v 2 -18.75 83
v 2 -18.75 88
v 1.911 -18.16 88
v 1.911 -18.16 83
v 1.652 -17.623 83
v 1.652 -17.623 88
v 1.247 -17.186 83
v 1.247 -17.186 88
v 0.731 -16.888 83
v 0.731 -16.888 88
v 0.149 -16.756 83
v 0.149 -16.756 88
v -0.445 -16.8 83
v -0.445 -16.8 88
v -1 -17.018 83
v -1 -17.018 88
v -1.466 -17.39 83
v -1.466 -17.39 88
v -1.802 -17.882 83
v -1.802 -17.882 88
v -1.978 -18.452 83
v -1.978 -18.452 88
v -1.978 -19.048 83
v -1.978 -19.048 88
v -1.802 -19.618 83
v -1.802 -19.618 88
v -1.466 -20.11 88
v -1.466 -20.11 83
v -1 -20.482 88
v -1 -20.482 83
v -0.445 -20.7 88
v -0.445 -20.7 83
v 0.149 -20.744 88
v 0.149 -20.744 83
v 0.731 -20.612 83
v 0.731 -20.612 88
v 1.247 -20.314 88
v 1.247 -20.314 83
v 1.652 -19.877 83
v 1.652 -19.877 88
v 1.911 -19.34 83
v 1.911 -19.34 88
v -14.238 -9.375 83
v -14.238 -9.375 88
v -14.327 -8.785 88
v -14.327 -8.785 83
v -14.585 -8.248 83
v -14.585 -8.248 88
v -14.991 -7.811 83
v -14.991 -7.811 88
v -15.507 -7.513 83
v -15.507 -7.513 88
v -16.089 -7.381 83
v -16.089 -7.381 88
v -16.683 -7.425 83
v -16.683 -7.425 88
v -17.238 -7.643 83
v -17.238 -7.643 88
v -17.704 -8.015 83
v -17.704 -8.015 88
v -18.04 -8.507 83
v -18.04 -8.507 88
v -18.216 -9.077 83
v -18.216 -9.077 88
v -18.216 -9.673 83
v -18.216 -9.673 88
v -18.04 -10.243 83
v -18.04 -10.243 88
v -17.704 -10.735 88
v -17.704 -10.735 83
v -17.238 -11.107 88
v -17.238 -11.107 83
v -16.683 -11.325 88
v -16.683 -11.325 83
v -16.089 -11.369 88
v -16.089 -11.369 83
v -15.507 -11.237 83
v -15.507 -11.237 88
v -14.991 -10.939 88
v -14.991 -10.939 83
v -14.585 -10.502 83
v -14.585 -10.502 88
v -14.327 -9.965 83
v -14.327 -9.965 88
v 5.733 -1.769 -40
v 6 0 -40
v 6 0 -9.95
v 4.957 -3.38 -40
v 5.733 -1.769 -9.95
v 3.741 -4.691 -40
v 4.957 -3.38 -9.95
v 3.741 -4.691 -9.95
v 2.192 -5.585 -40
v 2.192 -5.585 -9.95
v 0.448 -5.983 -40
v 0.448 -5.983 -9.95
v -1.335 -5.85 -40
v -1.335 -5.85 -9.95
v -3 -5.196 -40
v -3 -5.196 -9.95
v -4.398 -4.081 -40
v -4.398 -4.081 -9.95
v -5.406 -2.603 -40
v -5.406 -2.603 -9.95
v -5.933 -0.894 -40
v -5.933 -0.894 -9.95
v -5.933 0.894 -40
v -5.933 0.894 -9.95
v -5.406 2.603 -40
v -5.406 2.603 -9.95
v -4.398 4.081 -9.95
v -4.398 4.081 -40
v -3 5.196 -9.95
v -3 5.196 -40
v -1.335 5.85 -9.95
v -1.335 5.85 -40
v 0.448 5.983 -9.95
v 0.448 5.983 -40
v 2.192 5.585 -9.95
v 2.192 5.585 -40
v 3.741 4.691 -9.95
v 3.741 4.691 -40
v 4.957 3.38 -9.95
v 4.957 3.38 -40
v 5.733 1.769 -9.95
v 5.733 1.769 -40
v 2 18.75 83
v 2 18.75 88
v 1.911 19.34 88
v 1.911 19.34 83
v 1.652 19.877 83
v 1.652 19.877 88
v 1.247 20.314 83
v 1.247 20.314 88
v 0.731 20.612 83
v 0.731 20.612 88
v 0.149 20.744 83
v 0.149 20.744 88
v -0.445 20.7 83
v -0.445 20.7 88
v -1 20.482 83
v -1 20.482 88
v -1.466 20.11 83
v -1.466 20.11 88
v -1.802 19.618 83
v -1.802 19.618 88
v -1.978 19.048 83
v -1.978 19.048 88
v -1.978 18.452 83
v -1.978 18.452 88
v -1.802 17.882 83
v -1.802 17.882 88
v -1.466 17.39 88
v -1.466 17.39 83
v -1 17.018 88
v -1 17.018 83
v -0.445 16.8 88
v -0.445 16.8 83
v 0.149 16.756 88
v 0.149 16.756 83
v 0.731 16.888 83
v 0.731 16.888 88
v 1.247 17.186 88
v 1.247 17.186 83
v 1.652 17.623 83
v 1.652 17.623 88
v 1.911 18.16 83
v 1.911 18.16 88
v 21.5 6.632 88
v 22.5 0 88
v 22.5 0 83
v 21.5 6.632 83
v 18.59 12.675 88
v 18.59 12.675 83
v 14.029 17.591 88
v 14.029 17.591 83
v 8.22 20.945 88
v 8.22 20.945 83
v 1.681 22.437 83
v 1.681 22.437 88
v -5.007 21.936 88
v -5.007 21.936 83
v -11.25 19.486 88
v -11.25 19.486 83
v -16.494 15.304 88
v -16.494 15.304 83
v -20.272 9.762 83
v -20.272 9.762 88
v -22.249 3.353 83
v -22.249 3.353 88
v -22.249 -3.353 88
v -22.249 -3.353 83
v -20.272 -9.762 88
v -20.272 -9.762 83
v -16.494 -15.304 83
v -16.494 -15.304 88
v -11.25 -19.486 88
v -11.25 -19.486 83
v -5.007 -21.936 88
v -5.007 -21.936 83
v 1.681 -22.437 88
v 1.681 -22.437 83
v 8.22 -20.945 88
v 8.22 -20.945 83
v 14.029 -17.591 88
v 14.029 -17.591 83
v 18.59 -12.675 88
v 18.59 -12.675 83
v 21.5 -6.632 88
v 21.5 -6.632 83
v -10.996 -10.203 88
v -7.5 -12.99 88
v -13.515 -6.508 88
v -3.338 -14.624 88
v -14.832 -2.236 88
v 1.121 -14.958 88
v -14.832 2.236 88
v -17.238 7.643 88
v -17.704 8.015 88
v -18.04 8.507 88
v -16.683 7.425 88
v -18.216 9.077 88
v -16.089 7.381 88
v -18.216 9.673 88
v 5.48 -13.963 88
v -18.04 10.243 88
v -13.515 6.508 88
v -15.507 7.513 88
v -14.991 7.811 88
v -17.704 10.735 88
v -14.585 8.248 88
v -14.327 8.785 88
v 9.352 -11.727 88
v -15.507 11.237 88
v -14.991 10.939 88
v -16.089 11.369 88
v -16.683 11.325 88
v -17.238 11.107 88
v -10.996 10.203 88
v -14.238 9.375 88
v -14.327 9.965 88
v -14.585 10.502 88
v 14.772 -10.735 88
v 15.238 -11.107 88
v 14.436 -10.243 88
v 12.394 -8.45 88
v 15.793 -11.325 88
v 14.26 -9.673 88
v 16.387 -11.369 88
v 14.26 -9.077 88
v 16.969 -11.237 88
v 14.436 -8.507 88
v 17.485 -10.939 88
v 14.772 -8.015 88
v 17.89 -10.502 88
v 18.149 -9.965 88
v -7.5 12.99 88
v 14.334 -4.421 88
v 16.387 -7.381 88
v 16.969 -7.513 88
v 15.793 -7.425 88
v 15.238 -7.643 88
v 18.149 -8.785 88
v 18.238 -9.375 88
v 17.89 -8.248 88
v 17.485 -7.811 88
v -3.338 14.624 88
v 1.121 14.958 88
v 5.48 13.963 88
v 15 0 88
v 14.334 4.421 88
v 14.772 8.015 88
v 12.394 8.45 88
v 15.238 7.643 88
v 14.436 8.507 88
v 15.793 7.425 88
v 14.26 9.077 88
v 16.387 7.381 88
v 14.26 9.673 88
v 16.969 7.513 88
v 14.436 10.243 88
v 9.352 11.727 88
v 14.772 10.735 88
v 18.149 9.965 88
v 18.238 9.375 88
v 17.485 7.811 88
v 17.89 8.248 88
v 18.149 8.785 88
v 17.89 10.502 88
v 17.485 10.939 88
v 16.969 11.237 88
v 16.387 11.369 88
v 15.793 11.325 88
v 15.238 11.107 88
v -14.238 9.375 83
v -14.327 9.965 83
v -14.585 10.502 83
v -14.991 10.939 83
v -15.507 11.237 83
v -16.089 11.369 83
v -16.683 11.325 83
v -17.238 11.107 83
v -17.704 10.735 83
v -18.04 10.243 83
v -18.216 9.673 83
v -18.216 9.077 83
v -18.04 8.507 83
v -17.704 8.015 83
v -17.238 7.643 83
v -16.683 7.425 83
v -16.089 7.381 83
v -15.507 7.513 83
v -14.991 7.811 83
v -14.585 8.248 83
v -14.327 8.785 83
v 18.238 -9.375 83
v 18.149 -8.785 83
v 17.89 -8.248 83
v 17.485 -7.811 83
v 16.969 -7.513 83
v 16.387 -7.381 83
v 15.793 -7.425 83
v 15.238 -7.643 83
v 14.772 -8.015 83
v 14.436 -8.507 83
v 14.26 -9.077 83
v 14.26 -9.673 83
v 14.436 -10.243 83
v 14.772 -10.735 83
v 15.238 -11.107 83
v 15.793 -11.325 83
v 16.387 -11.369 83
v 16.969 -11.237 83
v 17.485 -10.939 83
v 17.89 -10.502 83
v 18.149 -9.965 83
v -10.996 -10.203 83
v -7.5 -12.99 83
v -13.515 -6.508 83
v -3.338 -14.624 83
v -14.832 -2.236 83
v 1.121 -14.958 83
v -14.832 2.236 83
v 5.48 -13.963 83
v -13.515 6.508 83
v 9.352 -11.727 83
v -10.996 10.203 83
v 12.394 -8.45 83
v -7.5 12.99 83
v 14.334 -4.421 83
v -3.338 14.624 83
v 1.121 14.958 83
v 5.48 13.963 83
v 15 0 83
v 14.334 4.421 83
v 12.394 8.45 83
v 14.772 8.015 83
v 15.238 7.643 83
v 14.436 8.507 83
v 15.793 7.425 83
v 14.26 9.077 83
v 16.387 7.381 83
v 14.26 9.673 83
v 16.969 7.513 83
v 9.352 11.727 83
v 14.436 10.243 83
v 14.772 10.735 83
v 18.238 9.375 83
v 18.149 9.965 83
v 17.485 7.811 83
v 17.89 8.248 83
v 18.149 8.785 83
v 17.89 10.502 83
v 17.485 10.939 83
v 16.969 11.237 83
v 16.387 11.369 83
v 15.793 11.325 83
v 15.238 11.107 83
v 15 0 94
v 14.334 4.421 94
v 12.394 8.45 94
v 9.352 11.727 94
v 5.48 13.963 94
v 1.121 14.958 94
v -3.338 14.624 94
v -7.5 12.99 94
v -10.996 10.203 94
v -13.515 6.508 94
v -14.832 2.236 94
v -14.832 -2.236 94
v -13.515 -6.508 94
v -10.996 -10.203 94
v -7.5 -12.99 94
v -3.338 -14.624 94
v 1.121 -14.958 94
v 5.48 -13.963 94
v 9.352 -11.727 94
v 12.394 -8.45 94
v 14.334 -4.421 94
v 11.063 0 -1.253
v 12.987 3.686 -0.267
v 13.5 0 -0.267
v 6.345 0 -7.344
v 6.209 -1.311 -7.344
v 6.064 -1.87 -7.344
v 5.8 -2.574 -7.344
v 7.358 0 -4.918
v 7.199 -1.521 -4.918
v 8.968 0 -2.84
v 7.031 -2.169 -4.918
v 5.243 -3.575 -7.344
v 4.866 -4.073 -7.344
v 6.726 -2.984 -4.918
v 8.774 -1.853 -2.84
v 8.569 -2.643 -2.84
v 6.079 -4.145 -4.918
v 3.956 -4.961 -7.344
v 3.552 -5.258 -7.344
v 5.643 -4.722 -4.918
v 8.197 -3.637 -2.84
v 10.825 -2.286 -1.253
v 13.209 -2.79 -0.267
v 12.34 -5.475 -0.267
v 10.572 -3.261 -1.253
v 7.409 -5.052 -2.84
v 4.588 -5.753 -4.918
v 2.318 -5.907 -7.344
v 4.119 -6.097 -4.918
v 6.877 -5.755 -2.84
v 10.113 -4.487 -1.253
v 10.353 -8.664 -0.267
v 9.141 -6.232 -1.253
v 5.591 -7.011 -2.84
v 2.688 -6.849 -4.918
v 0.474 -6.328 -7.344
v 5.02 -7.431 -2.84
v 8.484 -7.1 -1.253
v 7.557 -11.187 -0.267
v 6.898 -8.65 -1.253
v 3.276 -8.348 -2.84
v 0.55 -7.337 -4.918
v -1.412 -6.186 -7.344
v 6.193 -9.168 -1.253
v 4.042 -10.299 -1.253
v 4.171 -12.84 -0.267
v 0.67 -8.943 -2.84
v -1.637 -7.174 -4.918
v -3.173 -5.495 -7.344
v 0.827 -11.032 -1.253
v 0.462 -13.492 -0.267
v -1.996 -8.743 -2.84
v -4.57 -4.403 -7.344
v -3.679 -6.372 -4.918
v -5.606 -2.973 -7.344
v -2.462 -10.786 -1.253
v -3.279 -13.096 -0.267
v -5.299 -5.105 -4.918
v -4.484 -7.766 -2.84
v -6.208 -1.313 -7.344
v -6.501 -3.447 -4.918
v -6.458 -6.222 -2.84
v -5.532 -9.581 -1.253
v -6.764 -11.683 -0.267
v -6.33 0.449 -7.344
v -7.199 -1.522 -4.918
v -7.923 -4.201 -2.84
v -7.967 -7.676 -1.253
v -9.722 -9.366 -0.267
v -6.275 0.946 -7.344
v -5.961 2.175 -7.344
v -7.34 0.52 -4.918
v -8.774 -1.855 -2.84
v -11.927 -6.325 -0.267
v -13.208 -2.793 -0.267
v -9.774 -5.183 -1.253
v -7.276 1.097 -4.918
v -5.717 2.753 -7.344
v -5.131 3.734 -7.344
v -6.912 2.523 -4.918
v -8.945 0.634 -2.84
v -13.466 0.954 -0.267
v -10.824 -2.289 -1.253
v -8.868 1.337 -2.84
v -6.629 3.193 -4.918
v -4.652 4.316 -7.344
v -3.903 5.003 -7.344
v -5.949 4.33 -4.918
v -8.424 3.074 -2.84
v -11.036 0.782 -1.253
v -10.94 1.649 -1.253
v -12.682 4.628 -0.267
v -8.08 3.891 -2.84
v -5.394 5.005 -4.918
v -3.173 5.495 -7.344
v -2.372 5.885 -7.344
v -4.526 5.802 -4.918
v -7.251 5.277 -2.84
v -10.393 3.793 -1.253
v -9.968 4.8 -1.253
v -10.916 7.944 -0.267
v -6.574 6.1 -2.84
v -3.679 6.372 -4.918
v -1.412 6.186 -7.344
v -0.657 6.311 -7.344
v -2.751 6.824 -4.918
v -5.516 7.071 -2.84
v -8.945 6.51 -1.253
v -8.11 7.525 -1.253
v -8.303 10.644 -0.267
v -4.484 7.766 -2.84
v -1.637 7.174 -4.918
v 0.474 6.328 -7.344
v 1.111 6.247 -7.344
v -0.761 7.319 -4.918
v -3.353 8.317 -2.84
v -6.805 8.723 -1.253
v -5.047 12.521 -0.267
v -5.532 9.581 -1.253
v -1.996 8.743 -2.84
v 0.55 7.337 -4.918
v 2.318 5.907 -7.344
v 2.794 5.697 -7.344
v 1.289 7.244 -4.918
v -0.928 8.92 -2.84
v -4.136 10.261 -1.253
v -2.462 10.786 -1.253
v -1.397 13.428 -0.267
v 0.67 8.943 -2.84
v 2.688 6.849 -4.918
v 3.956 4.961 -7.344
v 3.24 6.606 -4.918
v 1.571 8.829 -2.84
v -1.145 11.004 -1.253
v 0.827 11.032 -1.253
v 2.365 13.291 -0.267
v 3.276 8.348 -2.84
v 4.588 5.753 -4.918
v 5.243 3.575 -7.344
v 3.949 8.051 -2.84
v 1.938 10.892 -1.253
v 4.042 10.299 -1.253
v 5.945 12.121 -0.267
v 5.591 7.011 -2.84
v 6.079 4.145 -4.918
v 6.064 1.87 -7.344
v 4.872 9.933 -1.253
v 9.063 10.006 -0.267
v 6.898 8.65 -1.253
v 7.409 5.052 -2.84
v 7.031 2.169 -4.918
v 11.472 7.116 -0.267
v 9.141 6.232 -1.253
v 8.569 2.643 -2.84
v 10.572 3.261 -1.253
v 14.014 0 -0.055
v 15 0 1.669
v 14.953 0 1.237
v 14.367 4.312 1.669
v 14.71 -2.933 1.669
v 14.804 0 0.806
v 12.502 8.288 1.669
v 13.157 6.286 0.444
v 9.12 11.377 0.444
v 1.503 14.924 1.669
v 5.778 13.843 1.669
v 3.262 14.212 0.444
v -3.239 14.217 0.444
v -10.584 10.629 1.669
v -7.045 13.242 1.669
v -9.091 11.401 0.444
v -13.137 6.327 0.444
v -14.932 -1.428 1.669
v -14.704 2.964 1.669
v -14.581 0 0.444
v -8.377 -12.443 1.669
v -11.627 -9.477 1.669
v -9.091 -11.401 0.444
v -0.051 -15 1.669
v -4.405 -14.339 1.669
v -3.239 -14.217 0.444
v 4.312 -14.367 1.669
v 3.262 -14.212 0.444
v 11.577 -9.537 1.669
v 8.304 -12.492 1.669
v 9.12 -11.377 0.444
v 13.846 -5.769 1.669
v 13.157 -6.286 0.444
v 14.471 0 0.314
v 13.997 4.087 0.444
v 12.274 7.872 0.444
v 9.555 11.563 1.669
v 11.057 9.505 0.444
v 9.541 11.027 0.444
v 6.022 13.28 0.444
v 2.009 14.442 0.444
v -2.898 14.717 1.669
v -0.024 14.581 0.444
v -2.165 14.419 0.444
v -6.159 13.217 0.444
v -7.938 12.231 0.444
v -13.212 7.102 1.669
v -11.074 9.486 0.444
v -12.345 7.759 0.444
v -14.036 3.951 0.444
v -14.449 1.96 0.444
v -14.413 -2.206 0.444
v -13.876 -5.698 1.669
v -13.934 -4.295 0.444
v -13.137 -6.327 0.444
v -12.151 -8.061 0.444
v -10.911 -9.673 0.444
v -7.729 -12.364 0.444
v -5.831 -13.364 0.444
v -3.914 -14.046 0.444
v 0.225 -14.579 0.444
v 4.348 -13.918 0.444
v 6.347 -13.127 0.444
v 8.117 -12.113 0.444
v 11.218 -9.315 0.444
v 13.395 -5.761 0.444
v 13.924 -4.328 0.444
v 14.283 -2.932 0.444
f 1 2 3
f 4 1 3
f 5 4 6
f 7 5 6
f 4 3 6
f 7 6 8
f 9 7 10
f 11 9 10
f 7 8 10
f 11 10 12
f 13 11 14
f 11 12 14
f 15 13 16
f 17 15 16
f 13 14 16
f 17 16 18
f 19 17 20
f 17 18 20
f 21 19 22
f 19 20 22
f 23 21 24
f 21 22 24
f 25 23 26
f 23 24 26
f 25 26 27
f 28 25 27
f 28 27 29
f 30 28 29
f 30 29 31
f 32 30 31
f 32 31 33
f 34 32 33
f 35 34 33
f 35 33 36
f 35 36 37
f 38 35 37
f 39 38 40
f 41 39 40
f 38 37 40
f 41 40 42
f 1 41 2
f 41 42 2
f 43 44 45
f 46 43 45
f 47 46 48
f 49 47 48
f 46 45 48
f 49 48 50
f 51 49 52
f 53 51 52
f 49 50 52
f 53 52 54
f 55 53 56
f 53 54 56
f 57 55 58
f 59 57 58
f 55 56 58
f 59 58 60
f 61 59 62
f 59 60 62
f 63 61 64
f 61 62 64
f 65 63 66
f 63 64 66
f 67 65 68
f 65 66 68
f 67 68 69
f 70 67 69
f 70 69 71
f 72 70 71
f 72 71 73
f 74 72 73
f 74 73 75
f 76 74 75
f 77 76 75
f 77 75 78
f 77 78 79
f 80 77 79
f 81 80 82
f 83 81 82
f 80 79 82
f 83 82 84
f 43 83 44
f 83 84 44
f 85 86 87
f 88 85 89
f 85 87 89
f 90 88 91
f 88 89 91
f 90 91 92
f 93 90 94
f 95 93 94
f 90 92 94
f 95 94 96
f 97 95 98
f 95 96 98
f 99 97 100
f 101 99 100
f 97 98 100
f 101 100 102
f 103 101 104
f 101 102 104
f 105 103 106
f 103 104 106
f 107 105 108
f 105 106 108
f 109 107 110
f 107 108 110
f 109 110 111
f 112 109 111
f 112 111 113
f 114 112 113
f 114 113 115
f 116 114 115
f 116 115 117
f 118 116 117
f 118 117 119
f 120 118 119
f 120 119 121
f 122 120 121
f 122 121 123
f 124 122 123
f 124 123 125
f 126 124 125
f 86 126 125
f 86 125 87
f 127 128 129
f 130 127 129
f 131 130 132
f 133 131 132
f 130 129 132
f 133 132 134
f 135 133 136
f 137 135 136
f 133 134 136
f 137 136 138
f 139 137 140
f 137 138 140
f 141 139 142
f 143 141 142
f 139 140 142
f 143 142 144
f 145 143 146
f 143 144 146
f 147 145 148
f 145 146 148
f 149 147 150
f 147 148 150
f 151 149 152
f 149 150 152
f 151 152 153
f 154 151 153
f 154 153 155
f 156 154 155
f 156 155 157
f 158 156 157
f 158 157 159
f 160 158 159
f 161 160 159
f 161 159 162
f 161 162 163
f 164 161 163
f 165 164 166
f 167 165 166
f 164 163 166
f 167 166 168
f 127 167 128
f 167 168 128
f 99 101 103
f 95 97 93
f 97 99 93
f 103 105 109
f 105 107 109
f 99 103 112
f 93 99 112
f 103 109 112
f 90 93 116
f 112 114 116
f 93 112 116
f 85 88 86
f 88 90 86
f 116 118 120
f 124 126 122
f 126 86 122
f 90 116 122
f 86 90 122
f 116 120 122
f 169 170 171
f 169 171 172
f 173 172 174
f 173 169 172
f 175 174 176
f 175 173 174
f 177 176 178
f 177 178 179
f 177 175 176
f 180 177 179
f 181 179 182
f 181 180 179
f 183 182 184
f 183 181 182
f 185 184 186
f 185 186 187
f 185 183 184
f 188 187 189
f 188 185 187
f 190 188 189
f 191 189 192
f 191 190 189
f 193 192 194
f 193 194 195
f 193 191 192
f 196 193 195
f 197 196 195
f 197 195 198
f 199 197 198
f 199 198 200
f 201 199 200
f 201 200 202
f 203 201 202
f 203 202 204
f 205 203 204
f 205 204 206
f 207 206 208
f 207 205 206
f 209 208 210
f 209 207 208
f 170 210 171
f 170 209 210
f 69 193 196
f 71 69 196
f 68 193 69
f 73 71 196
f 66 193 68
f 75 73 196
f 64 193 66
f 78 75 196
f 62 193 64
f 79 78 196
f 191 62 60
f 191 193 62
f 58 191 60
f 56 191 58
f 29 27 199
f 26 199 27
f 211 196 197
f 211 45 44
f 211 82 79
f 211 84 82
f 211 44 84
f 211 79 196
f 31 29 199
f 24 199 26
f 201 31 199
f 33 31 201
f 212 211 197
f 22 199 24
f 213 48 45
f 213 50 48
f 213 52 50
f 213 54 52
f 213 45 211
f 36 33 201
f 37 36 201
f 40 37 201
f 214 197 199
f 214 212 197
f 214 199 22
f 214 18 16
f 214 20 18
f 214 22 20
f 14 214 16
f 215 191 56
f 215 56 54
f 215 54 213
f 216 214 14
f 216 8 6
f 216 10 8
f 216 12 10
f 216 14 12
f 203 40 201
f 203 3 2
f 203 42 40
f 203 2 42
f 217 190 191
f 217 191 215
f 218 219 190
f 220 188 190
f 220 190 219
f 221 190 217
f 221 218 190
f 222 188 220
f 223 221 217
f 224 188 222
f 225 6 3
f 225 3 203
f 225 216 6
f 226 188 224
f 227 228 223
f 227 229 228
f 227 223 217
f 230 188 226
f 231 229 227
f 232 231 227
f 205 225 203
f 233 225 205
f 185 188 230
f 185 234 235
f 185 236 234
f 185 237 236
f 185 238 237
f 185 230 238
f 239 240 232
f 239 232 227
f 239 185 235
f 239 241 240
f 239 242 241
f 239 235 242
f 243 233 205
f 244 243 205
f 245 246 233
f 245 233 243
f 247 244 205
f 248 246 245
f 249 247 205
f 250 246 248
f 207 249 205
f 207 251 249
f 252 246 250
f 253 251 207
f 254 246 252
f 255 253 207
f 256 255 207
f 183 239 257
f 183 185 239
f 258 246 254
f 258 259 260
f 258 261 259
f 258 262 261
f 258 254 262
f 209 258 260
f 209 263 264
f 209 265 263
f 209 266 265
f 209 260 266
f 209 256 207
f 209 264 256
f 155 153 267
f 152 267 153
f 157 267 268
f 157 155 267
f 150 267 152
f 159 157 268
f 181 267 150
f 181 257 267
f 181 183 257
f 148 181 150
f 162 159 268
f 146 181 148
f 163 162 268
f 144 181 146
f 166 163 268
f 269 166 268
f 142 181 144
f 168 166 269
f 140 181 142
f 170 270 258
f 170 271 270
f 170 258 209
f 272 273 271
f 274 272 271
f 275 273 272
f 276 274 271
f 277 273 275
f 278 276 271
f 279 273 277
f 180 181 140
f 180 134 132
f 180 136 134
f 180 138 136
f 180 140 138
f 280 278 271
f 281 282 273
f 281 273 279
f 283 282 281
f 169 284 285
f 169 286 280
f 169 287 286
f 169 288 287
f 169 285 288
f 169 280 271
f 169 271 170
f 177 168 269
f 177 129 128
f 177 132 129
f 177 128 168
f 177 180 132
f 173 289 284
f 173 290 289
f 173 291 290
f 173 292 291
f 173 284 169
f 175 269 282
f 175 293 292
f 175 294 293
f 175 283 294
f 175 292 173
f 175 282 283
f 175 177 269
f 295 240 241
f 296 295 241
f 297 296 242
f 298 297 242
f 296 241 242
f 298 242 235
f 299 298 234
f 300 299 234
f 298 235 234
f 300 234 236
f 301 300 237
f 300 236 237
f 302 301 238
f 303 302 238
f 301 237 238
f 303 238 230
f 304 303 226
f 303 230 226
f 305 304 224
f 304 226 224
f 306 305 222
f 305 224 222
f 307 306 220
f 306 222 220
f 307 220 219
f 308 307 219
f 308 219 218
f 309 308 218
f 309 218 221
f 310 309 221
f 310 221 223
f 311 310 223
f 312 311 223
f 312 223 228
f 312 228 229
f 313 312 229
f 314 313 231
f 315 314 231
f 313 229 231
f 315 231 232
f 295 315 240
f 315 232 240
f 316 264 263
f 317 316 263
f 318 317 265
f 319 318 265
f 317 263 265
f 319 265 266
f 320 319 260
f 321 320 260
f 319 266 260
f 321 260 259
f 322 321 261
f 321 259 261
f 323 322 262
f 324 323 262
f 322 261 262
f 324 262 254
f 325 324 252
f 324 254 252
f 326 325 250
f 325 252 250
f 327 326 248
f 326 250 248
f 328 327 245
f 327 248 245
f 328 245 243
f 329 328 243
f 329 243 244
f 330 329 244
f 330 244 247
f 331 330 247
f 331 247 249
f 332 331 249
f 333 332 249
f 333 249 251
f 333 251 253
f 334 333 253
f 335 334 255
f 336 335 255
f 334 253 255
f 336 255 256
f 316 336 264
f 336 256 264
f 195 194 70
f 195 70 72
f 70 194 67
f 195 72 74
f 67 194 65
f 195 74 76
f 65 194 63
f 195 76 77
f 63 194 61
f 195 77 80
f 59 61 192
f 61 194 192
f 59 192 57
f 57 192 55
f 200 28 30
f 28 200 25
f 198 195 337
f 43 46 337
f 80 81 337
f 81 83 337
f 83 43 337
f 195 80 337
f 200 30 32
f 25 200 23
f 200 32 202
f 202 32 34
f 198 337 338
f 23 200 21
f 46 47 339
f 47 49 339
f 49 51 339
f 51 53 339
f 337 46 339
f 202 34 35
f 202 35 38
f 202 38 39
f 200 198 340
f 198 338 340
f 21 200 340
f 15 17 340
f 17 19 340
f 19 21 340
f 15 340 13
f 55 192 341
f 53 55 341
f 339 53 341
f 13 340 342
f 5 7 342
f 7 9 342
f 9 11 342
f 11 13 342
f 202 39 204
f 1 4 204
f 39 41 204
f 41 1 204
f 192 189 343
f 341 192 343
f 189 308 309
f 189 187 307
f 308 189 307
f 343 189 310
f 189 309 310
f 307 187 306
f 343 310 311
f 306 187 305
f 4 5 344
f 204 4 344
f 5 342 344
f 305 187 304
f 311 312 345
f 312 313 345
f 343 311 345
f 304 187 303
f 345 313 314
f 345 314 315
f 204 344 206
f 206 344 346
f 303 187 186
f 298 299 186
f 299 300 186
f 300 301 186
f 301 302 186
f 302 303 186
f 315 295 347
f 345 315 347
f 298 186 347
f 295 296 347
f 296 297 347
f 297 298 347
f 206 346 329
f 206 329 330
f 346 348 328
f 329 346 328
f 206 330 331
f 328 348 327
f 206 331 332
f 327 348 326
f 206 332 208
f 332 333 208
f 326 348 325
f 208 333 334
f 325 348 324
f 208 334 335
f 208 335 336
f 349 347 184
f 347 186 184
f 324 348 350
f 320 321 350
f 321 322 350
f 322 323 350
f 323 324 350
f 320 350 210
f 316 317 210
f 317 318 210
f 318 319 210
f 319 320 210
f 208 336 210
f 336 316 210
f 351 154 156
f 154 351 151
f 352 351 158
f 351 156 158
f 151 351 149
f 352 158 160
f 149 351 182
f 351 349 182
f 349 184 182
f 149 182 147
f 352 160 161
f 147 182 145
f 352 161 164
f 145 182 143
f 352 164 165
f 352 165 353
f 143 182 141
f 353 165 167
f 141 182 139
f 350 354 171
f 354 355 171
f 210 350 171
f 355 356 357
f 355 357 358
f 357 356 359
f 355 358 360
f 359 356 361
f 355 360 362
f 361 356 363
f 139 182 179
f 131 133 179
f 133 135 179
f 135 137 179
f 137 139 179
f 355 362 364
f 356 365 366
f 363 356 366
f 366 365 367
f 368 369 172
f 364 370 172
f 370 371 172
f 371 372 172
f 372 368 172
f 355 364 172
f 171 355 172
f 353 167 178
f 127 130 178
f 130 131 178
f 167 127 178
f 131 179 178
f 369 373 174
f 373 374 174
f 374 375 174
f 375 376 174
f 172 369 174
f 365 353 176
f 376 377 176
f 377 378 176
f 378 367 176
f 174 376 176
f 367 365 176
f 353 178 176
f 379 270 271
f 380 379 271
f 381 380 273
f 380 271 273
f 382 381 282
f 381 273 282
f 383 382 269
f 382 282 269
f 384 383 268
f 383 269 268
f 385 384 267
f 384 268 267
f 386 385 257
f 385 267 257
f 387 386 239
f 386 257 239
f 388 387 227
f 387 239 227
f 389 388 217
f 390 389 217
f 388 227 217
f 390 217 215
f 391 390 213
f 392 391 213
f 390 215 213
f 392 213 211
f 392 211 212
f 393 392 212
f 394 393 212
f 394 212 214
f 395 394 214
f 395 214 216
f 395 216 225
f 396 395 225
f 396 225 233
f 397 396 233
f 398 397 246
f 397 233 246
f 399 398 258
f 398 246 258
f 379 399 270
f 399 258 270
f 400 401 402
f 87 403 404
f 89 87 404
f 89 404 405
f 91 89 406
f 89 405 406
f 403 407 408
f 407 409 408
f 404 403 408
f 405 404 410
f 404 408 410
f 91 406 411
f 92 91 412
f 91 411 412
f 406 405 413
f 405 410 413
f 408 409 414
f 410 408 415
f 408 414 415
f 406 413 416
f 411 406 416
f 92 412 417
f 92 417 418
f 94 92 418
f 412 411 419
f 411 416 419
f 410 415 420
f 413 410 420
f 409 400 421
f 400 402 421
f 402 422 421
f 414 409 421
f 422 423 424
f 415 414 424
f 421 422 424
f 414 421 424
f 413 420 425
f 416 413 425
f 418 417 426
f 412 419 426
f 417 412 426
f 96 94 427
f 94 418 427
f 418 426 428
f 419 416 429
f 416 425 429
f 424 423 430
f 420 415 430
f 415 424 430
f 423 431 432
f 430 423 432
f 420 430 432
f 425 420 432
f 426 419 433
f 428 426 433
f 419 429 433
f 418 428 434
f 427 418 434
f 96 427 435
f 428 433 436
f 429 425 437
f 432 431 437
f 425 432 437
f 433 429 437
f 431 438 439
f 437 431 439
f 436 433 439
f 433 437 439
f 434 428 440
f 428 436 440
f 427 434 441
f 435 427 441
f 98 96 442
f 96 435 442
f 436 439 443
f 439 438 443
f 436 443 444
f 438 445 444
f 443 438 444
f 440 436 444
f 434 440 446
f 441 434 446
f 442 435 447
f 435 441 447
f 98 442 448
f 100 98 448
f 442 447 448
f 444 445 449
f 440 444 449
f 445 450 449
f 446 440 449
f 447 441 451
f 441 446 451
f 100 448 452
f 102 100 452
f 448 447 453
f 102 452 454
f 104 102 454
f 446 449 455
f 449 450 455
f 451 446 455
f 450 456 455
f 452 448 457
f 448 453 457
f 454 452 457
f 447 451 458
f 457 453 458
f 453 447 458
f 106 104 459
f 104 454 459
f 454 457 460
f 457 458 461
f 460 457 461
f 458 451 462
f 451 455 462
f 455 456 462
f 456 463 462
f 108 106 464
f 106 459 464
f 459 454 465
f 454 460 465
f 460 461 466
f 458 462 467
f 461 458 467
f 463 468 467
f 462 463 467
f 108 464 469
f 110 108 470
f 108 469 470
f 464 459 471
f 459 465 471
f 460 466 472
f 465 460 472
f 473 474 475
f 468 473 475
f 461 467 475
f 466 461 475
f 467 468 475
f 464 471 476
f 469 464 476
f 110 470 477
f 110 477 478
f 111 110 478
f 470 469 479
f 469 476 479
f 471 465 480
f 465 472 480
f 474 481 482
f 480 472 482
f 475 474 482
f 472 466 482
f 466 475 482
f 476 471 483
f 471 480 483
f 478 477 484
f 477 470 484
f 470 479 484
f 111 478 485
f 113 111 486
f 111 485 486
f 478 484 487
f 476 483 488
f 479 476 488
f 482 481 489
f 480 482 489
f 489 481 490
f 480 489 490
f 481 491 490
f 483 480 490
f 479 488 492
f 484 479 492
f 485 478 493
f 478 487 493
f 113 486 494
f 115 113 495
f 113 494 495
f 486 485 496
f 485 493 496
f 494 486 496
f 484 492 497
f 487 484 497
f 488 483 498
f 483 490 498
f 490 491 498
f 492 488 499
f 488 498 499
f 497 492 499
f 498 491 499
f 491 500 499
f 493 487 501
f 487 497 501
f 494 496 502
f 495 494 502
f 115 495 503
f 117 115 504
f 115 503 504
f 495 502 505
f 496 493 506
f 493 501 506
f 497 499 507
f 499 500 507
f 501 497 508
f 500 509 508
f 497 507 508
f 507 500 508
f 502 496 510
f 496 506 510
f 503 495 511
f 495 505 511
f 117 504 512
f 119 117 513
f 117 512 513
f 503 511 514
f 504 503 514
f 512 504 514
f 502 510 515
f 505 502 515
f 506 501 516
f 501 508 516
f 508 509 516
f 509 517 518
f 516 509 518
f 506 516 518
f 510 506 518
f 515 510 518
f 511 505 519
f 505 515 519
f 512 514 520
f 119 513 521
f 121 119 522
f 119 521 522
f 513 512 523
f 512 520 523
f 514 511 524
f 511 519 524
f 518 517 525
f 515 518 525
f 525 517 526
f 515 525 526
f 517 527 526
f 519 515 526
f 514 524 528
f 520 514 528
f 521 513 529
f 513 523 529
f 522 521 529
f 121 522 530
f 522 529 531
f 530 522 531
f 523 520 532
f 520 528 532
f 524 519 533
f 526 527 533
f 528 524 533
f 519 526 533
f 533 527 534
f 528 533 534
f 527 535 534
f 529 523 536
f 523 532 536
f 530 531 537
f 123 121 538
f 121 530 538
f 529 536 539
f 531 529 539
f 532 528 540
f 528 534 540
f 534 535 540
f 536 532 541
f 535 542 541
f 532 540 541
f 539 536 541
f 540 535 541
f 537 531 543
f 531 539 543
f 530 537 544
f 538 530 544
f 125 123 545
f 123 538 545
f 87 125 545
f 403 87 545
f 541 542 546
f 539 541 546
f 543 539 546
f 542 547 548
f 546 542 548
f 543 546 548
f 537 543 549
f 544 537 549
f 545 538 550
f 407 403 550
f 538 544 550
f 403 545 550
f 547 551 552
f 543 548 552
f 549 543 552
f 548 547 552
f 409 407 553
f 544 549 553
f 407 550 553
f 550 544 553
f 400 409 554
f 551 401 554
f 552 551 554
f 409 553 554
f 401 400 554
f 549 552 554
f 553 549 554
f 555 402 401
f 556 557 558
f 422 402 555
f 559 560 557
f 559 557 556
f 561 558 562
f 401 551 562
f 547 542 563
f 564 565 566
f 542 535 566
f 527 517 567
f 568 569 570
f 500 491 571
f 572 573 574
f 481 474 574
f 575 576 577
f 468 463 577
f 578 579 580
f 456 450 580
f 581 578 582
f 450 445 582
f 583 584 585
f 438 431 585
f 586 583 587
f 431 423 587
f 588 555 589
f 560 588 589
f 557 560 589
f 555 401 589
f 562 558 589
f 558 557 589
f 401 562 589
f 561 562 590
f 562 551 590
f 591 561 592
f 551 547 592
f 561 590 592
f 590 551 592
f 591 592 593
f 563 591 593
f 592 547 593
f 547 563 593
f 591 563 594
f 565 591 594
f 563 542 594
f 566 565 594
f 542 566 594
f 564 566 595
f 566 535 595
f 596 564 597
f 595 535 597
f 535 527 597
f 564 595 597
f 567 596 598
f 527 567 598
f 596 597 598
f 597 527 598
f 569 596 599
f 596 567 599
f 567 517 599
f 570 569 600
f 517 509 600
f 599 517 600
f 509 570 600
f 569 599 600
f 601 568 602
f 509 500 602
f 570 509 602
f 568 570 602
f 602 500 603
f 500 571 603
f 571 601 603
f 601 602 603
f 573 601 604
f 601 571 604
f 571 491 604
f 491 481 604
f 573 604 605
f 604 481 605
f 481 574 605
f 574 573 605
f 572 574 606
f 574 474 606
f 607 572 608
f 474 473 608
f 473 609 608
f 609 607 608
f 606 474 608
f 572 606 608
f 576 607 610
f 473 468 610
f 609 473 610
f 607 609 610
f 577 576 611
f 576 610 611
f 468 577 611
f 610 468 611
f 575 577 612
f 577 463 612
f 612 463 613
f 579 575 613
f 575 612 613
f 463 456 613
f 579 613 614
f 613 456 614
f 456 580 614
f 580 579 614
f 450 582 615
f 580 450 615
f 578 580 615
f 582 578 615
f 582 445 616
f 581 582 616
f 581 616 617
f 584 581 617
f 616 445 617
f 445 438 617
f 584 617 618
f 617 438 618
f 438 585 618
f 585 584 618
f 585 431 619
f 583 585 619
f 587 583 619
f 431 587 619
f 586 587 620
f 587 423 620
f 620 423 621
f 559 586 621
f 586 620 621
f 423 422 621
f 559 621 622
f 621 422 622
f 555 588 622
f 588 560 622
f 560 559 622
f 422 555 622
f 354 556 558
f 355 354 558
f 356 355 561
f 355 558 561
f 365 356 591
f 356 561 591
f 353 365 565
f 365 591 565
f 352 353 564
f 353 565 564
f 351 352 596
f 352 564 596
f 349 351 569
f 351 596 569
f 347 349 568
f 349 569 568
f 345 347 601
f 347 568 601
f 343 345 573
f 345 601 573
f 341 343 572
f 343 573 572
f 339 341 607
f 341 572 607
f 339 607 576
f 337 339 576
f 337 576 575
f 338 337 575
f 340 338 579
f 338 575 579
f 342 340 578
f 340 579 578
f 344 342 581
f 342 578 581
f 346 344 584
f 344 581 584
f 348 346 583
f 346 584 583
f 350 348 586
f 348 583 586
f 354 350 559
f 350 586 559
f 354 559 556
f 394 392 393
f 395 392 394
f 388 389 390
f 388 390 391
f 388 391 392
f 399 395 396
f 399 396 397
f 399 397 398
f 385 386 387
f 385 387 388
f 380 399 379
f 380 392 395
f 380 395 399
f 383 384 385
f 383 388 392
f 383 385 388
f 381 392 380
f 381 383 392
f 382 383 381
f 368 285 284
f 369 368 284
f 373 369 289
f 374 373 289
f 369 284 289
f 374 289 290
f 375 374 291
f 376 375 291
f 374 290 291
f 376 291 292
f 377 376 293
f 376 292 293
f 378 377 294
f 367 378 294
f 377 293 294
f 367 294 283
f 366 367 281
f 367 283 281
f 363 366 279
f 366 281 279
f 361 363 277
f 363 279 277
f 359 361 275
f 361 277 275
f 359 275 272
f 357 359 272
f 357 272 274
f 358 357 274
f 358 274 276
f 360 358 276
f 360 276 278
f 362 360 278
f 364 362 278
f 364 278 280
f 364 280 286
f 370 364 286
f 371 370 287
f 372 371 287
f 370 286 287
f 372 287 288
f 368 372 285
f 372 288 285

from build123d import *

# Parameters (mm, degrees)
SKETCH1_R             = 15
BOSS_EXTRUDE1_DEPTH   = 77
SKETCH3_R             = 15
SKETCH3_R_2           = 7.5
BOSS_EXTRUDE2_DEPTH   = 17
BOSS_EXTRUDE3_START   = -6
SKETCH4_R             = 22.5
SKETCH4_R_2           = 12.5
SKETCH4_R_3           = 2
BOSS_EXTRUDE3_DEPTH   = 5
SKETCH6_R             = 6
SKETCH6_R_2           = 3
BOSS_EXTRUDE4_DEPTH   = 40
CUT_EXTRUDE2_START    = -72
SKETCH9_R             = 7.5
CUT_EXTRUDE2_DEPTH    = 72
CUT_EXTRUDE3_START    = -5
SKETCH10_R            = 3
CUT_EXTRUDE3_DEPTH    = 5
FILLET1_R             = 10
FILLET2_R             = 2
BOSS_EXTRUDE5_START   = -89
SKETCH12_R            = 7.5
BOSS_EXTRUDE5_DEPTH   = 89
DELETEFACE2_START     = -40
DELETEFACE2_OUTLINE_R = 3
DELETEFACE2_DEPTH     = 45


# Read off the part's stored shape, not the designer's step: DeleteFace2
with BuildPart() as part:
    # Sketch1 → Boss-Extrude1 (new body)
    with BuildSketch(Plane.XY):
        Circle(SKETCH1_R)
    extrude(amount=BOSS_EXTRUDE1_DEPTH)

    # Sketch3 → Boss-Extrude2 (add)
    with BuildSketch(Plane.XY.offset(77)):
        Circle(SKETCH3_R)
        Circle(SKETCH3_R_2, mode=Mode.SUBTRACT)
    extrude(amount=BOSS_EXTRUDE2_DEPTH)

    # Sketch4 → Boss-Extrude3 (add)
    with BuildSketch(Plane.XY.offset(94).offset(BOSS_EXTRUDE3_START)):
        Circle(SKETCH4_R)
        Circle(SKETCH4_R_2, mode=Mode.SUBTRACT)
        with Locations((0, 18.75)):
            Circle(SKETCH4_R_3, mode=Mode.SUBTRACT)
        with Locations((16.237976321, 9.375)):
            Circle(SKETCH4_R_3, mode=Mode.SUBTRACT)
        with Locations((16.237976321, -9.375)):
            Circle(SKETCH4_R_3, mode=Mode.SUBTRACT)
        with Locations((0, -18.75)):
            Circle(SKETCH4_R_3, mode=Mode.SUBTRACT)
        with Locations((-16.237976321, -9.375)):
            Circle(SKETCH4_R_3, mode=Mode.SUBTRACT)
        with Locations((-16.237976321, 9.375)):
            Circle(SKETCH4_R_3, mode=Mode.SUBTRACT)
    extrude(amount=-BOSS_EXTRUDE3_DEPTH)

    # Sketch6 → Boss-Extrude4 (add)
    with BuildSketch(Plane(origin=(0, 0, 0), x_dir=(-1, 0, 0), z_dir=(0, 0, -1))):
        with Locations(Location((0, 0, 0), (0, 0, 180))):
            Circle(SKETCH6_R)
        Circle(SKETCH6_R_2, mode=Mode.SUBTRACT)
    extrude(amount=BOSS_EXTRUDE4_DEPTH)

    # Sketch9 → Cut-Extrude2 (cut)
    with BuildSketch(Plane.XY.offset(77).offset(CUT_EXTRUDE2_START)):
        Circle(SKETCH9_R)
    extrude(amount=CUT_EXTRUDE2_DEPTH, mode=Mode.SUBTRACT)

    # Sketch10 → Cut-Extrude3 (cut)
    with BuildSketch(Plane(origin=(0, 0, 0), x_dir=(-1, 0, 0), z_dir=(0, 0, -1)).offset(CUT_EXTRUDE3_START)):
        with Locations(Location((0, 0, 0), (0, 0, 180))):
            Circle(SKETCH10_R)
    extrude(amount=CUT_EXTRUDE3_DEPTH, mode=Mode.SUBTRACT)

    # Fillet1
    # the kernel refuses this fillet: 10 mm, written as the material it adds along each edge
    with BuildSketch(Plane(origin=(0, 0, 0), x_dir=(1, 0, 0), z_dir=(0, 1, 0))) as fillet1_piece_1:
        with BuildLine():
            CenterArc((16, 9.949874371), FILLET1_R, 180, 84.260829523)
            Line((6, 9.949874371), (5.8, 9.949874371))
            Line((5.8, 9.949874371), (5.8, 0))
            Line((5.8, 0), (6, -0.2))
            ThreePointArc((6, -0.2), (10.5, -0.2), (14.98, -0.198997487))
            Line((14.98, -0.198997487), (15, 0))
        make_face()
    revolve(axis=Axis((0, 0, 0), (0, 0, -1)))

    # Fillet2
    fillet2_edges = [part.edges().sort_by_distance(p)[0] for p in [
        (-15, 0, 0),
    ]]
    fillet(fillet2_edges, radius=FILLET2_R)

    # Sketch12 → Boss-Extrude5 (add)
    with BuildSketch(Plane.XY.offset(94).offset(BOSS_EXTRUDE5_START)):
        Circle(SKETCH12_R)
    extrude(amount=BOSS_EXTRUDE5_DEPTH)

    # DeleteFace2 outline → DeleteFace2 (add)
    with BuildSketch(Plane.XY.offset(DELETEFACE2_START)):
        Circle(DELETEFACE2_OUTLINE_R)
    extrude(amount=DELETEFACE2_DEPTH)


solid = part.part
